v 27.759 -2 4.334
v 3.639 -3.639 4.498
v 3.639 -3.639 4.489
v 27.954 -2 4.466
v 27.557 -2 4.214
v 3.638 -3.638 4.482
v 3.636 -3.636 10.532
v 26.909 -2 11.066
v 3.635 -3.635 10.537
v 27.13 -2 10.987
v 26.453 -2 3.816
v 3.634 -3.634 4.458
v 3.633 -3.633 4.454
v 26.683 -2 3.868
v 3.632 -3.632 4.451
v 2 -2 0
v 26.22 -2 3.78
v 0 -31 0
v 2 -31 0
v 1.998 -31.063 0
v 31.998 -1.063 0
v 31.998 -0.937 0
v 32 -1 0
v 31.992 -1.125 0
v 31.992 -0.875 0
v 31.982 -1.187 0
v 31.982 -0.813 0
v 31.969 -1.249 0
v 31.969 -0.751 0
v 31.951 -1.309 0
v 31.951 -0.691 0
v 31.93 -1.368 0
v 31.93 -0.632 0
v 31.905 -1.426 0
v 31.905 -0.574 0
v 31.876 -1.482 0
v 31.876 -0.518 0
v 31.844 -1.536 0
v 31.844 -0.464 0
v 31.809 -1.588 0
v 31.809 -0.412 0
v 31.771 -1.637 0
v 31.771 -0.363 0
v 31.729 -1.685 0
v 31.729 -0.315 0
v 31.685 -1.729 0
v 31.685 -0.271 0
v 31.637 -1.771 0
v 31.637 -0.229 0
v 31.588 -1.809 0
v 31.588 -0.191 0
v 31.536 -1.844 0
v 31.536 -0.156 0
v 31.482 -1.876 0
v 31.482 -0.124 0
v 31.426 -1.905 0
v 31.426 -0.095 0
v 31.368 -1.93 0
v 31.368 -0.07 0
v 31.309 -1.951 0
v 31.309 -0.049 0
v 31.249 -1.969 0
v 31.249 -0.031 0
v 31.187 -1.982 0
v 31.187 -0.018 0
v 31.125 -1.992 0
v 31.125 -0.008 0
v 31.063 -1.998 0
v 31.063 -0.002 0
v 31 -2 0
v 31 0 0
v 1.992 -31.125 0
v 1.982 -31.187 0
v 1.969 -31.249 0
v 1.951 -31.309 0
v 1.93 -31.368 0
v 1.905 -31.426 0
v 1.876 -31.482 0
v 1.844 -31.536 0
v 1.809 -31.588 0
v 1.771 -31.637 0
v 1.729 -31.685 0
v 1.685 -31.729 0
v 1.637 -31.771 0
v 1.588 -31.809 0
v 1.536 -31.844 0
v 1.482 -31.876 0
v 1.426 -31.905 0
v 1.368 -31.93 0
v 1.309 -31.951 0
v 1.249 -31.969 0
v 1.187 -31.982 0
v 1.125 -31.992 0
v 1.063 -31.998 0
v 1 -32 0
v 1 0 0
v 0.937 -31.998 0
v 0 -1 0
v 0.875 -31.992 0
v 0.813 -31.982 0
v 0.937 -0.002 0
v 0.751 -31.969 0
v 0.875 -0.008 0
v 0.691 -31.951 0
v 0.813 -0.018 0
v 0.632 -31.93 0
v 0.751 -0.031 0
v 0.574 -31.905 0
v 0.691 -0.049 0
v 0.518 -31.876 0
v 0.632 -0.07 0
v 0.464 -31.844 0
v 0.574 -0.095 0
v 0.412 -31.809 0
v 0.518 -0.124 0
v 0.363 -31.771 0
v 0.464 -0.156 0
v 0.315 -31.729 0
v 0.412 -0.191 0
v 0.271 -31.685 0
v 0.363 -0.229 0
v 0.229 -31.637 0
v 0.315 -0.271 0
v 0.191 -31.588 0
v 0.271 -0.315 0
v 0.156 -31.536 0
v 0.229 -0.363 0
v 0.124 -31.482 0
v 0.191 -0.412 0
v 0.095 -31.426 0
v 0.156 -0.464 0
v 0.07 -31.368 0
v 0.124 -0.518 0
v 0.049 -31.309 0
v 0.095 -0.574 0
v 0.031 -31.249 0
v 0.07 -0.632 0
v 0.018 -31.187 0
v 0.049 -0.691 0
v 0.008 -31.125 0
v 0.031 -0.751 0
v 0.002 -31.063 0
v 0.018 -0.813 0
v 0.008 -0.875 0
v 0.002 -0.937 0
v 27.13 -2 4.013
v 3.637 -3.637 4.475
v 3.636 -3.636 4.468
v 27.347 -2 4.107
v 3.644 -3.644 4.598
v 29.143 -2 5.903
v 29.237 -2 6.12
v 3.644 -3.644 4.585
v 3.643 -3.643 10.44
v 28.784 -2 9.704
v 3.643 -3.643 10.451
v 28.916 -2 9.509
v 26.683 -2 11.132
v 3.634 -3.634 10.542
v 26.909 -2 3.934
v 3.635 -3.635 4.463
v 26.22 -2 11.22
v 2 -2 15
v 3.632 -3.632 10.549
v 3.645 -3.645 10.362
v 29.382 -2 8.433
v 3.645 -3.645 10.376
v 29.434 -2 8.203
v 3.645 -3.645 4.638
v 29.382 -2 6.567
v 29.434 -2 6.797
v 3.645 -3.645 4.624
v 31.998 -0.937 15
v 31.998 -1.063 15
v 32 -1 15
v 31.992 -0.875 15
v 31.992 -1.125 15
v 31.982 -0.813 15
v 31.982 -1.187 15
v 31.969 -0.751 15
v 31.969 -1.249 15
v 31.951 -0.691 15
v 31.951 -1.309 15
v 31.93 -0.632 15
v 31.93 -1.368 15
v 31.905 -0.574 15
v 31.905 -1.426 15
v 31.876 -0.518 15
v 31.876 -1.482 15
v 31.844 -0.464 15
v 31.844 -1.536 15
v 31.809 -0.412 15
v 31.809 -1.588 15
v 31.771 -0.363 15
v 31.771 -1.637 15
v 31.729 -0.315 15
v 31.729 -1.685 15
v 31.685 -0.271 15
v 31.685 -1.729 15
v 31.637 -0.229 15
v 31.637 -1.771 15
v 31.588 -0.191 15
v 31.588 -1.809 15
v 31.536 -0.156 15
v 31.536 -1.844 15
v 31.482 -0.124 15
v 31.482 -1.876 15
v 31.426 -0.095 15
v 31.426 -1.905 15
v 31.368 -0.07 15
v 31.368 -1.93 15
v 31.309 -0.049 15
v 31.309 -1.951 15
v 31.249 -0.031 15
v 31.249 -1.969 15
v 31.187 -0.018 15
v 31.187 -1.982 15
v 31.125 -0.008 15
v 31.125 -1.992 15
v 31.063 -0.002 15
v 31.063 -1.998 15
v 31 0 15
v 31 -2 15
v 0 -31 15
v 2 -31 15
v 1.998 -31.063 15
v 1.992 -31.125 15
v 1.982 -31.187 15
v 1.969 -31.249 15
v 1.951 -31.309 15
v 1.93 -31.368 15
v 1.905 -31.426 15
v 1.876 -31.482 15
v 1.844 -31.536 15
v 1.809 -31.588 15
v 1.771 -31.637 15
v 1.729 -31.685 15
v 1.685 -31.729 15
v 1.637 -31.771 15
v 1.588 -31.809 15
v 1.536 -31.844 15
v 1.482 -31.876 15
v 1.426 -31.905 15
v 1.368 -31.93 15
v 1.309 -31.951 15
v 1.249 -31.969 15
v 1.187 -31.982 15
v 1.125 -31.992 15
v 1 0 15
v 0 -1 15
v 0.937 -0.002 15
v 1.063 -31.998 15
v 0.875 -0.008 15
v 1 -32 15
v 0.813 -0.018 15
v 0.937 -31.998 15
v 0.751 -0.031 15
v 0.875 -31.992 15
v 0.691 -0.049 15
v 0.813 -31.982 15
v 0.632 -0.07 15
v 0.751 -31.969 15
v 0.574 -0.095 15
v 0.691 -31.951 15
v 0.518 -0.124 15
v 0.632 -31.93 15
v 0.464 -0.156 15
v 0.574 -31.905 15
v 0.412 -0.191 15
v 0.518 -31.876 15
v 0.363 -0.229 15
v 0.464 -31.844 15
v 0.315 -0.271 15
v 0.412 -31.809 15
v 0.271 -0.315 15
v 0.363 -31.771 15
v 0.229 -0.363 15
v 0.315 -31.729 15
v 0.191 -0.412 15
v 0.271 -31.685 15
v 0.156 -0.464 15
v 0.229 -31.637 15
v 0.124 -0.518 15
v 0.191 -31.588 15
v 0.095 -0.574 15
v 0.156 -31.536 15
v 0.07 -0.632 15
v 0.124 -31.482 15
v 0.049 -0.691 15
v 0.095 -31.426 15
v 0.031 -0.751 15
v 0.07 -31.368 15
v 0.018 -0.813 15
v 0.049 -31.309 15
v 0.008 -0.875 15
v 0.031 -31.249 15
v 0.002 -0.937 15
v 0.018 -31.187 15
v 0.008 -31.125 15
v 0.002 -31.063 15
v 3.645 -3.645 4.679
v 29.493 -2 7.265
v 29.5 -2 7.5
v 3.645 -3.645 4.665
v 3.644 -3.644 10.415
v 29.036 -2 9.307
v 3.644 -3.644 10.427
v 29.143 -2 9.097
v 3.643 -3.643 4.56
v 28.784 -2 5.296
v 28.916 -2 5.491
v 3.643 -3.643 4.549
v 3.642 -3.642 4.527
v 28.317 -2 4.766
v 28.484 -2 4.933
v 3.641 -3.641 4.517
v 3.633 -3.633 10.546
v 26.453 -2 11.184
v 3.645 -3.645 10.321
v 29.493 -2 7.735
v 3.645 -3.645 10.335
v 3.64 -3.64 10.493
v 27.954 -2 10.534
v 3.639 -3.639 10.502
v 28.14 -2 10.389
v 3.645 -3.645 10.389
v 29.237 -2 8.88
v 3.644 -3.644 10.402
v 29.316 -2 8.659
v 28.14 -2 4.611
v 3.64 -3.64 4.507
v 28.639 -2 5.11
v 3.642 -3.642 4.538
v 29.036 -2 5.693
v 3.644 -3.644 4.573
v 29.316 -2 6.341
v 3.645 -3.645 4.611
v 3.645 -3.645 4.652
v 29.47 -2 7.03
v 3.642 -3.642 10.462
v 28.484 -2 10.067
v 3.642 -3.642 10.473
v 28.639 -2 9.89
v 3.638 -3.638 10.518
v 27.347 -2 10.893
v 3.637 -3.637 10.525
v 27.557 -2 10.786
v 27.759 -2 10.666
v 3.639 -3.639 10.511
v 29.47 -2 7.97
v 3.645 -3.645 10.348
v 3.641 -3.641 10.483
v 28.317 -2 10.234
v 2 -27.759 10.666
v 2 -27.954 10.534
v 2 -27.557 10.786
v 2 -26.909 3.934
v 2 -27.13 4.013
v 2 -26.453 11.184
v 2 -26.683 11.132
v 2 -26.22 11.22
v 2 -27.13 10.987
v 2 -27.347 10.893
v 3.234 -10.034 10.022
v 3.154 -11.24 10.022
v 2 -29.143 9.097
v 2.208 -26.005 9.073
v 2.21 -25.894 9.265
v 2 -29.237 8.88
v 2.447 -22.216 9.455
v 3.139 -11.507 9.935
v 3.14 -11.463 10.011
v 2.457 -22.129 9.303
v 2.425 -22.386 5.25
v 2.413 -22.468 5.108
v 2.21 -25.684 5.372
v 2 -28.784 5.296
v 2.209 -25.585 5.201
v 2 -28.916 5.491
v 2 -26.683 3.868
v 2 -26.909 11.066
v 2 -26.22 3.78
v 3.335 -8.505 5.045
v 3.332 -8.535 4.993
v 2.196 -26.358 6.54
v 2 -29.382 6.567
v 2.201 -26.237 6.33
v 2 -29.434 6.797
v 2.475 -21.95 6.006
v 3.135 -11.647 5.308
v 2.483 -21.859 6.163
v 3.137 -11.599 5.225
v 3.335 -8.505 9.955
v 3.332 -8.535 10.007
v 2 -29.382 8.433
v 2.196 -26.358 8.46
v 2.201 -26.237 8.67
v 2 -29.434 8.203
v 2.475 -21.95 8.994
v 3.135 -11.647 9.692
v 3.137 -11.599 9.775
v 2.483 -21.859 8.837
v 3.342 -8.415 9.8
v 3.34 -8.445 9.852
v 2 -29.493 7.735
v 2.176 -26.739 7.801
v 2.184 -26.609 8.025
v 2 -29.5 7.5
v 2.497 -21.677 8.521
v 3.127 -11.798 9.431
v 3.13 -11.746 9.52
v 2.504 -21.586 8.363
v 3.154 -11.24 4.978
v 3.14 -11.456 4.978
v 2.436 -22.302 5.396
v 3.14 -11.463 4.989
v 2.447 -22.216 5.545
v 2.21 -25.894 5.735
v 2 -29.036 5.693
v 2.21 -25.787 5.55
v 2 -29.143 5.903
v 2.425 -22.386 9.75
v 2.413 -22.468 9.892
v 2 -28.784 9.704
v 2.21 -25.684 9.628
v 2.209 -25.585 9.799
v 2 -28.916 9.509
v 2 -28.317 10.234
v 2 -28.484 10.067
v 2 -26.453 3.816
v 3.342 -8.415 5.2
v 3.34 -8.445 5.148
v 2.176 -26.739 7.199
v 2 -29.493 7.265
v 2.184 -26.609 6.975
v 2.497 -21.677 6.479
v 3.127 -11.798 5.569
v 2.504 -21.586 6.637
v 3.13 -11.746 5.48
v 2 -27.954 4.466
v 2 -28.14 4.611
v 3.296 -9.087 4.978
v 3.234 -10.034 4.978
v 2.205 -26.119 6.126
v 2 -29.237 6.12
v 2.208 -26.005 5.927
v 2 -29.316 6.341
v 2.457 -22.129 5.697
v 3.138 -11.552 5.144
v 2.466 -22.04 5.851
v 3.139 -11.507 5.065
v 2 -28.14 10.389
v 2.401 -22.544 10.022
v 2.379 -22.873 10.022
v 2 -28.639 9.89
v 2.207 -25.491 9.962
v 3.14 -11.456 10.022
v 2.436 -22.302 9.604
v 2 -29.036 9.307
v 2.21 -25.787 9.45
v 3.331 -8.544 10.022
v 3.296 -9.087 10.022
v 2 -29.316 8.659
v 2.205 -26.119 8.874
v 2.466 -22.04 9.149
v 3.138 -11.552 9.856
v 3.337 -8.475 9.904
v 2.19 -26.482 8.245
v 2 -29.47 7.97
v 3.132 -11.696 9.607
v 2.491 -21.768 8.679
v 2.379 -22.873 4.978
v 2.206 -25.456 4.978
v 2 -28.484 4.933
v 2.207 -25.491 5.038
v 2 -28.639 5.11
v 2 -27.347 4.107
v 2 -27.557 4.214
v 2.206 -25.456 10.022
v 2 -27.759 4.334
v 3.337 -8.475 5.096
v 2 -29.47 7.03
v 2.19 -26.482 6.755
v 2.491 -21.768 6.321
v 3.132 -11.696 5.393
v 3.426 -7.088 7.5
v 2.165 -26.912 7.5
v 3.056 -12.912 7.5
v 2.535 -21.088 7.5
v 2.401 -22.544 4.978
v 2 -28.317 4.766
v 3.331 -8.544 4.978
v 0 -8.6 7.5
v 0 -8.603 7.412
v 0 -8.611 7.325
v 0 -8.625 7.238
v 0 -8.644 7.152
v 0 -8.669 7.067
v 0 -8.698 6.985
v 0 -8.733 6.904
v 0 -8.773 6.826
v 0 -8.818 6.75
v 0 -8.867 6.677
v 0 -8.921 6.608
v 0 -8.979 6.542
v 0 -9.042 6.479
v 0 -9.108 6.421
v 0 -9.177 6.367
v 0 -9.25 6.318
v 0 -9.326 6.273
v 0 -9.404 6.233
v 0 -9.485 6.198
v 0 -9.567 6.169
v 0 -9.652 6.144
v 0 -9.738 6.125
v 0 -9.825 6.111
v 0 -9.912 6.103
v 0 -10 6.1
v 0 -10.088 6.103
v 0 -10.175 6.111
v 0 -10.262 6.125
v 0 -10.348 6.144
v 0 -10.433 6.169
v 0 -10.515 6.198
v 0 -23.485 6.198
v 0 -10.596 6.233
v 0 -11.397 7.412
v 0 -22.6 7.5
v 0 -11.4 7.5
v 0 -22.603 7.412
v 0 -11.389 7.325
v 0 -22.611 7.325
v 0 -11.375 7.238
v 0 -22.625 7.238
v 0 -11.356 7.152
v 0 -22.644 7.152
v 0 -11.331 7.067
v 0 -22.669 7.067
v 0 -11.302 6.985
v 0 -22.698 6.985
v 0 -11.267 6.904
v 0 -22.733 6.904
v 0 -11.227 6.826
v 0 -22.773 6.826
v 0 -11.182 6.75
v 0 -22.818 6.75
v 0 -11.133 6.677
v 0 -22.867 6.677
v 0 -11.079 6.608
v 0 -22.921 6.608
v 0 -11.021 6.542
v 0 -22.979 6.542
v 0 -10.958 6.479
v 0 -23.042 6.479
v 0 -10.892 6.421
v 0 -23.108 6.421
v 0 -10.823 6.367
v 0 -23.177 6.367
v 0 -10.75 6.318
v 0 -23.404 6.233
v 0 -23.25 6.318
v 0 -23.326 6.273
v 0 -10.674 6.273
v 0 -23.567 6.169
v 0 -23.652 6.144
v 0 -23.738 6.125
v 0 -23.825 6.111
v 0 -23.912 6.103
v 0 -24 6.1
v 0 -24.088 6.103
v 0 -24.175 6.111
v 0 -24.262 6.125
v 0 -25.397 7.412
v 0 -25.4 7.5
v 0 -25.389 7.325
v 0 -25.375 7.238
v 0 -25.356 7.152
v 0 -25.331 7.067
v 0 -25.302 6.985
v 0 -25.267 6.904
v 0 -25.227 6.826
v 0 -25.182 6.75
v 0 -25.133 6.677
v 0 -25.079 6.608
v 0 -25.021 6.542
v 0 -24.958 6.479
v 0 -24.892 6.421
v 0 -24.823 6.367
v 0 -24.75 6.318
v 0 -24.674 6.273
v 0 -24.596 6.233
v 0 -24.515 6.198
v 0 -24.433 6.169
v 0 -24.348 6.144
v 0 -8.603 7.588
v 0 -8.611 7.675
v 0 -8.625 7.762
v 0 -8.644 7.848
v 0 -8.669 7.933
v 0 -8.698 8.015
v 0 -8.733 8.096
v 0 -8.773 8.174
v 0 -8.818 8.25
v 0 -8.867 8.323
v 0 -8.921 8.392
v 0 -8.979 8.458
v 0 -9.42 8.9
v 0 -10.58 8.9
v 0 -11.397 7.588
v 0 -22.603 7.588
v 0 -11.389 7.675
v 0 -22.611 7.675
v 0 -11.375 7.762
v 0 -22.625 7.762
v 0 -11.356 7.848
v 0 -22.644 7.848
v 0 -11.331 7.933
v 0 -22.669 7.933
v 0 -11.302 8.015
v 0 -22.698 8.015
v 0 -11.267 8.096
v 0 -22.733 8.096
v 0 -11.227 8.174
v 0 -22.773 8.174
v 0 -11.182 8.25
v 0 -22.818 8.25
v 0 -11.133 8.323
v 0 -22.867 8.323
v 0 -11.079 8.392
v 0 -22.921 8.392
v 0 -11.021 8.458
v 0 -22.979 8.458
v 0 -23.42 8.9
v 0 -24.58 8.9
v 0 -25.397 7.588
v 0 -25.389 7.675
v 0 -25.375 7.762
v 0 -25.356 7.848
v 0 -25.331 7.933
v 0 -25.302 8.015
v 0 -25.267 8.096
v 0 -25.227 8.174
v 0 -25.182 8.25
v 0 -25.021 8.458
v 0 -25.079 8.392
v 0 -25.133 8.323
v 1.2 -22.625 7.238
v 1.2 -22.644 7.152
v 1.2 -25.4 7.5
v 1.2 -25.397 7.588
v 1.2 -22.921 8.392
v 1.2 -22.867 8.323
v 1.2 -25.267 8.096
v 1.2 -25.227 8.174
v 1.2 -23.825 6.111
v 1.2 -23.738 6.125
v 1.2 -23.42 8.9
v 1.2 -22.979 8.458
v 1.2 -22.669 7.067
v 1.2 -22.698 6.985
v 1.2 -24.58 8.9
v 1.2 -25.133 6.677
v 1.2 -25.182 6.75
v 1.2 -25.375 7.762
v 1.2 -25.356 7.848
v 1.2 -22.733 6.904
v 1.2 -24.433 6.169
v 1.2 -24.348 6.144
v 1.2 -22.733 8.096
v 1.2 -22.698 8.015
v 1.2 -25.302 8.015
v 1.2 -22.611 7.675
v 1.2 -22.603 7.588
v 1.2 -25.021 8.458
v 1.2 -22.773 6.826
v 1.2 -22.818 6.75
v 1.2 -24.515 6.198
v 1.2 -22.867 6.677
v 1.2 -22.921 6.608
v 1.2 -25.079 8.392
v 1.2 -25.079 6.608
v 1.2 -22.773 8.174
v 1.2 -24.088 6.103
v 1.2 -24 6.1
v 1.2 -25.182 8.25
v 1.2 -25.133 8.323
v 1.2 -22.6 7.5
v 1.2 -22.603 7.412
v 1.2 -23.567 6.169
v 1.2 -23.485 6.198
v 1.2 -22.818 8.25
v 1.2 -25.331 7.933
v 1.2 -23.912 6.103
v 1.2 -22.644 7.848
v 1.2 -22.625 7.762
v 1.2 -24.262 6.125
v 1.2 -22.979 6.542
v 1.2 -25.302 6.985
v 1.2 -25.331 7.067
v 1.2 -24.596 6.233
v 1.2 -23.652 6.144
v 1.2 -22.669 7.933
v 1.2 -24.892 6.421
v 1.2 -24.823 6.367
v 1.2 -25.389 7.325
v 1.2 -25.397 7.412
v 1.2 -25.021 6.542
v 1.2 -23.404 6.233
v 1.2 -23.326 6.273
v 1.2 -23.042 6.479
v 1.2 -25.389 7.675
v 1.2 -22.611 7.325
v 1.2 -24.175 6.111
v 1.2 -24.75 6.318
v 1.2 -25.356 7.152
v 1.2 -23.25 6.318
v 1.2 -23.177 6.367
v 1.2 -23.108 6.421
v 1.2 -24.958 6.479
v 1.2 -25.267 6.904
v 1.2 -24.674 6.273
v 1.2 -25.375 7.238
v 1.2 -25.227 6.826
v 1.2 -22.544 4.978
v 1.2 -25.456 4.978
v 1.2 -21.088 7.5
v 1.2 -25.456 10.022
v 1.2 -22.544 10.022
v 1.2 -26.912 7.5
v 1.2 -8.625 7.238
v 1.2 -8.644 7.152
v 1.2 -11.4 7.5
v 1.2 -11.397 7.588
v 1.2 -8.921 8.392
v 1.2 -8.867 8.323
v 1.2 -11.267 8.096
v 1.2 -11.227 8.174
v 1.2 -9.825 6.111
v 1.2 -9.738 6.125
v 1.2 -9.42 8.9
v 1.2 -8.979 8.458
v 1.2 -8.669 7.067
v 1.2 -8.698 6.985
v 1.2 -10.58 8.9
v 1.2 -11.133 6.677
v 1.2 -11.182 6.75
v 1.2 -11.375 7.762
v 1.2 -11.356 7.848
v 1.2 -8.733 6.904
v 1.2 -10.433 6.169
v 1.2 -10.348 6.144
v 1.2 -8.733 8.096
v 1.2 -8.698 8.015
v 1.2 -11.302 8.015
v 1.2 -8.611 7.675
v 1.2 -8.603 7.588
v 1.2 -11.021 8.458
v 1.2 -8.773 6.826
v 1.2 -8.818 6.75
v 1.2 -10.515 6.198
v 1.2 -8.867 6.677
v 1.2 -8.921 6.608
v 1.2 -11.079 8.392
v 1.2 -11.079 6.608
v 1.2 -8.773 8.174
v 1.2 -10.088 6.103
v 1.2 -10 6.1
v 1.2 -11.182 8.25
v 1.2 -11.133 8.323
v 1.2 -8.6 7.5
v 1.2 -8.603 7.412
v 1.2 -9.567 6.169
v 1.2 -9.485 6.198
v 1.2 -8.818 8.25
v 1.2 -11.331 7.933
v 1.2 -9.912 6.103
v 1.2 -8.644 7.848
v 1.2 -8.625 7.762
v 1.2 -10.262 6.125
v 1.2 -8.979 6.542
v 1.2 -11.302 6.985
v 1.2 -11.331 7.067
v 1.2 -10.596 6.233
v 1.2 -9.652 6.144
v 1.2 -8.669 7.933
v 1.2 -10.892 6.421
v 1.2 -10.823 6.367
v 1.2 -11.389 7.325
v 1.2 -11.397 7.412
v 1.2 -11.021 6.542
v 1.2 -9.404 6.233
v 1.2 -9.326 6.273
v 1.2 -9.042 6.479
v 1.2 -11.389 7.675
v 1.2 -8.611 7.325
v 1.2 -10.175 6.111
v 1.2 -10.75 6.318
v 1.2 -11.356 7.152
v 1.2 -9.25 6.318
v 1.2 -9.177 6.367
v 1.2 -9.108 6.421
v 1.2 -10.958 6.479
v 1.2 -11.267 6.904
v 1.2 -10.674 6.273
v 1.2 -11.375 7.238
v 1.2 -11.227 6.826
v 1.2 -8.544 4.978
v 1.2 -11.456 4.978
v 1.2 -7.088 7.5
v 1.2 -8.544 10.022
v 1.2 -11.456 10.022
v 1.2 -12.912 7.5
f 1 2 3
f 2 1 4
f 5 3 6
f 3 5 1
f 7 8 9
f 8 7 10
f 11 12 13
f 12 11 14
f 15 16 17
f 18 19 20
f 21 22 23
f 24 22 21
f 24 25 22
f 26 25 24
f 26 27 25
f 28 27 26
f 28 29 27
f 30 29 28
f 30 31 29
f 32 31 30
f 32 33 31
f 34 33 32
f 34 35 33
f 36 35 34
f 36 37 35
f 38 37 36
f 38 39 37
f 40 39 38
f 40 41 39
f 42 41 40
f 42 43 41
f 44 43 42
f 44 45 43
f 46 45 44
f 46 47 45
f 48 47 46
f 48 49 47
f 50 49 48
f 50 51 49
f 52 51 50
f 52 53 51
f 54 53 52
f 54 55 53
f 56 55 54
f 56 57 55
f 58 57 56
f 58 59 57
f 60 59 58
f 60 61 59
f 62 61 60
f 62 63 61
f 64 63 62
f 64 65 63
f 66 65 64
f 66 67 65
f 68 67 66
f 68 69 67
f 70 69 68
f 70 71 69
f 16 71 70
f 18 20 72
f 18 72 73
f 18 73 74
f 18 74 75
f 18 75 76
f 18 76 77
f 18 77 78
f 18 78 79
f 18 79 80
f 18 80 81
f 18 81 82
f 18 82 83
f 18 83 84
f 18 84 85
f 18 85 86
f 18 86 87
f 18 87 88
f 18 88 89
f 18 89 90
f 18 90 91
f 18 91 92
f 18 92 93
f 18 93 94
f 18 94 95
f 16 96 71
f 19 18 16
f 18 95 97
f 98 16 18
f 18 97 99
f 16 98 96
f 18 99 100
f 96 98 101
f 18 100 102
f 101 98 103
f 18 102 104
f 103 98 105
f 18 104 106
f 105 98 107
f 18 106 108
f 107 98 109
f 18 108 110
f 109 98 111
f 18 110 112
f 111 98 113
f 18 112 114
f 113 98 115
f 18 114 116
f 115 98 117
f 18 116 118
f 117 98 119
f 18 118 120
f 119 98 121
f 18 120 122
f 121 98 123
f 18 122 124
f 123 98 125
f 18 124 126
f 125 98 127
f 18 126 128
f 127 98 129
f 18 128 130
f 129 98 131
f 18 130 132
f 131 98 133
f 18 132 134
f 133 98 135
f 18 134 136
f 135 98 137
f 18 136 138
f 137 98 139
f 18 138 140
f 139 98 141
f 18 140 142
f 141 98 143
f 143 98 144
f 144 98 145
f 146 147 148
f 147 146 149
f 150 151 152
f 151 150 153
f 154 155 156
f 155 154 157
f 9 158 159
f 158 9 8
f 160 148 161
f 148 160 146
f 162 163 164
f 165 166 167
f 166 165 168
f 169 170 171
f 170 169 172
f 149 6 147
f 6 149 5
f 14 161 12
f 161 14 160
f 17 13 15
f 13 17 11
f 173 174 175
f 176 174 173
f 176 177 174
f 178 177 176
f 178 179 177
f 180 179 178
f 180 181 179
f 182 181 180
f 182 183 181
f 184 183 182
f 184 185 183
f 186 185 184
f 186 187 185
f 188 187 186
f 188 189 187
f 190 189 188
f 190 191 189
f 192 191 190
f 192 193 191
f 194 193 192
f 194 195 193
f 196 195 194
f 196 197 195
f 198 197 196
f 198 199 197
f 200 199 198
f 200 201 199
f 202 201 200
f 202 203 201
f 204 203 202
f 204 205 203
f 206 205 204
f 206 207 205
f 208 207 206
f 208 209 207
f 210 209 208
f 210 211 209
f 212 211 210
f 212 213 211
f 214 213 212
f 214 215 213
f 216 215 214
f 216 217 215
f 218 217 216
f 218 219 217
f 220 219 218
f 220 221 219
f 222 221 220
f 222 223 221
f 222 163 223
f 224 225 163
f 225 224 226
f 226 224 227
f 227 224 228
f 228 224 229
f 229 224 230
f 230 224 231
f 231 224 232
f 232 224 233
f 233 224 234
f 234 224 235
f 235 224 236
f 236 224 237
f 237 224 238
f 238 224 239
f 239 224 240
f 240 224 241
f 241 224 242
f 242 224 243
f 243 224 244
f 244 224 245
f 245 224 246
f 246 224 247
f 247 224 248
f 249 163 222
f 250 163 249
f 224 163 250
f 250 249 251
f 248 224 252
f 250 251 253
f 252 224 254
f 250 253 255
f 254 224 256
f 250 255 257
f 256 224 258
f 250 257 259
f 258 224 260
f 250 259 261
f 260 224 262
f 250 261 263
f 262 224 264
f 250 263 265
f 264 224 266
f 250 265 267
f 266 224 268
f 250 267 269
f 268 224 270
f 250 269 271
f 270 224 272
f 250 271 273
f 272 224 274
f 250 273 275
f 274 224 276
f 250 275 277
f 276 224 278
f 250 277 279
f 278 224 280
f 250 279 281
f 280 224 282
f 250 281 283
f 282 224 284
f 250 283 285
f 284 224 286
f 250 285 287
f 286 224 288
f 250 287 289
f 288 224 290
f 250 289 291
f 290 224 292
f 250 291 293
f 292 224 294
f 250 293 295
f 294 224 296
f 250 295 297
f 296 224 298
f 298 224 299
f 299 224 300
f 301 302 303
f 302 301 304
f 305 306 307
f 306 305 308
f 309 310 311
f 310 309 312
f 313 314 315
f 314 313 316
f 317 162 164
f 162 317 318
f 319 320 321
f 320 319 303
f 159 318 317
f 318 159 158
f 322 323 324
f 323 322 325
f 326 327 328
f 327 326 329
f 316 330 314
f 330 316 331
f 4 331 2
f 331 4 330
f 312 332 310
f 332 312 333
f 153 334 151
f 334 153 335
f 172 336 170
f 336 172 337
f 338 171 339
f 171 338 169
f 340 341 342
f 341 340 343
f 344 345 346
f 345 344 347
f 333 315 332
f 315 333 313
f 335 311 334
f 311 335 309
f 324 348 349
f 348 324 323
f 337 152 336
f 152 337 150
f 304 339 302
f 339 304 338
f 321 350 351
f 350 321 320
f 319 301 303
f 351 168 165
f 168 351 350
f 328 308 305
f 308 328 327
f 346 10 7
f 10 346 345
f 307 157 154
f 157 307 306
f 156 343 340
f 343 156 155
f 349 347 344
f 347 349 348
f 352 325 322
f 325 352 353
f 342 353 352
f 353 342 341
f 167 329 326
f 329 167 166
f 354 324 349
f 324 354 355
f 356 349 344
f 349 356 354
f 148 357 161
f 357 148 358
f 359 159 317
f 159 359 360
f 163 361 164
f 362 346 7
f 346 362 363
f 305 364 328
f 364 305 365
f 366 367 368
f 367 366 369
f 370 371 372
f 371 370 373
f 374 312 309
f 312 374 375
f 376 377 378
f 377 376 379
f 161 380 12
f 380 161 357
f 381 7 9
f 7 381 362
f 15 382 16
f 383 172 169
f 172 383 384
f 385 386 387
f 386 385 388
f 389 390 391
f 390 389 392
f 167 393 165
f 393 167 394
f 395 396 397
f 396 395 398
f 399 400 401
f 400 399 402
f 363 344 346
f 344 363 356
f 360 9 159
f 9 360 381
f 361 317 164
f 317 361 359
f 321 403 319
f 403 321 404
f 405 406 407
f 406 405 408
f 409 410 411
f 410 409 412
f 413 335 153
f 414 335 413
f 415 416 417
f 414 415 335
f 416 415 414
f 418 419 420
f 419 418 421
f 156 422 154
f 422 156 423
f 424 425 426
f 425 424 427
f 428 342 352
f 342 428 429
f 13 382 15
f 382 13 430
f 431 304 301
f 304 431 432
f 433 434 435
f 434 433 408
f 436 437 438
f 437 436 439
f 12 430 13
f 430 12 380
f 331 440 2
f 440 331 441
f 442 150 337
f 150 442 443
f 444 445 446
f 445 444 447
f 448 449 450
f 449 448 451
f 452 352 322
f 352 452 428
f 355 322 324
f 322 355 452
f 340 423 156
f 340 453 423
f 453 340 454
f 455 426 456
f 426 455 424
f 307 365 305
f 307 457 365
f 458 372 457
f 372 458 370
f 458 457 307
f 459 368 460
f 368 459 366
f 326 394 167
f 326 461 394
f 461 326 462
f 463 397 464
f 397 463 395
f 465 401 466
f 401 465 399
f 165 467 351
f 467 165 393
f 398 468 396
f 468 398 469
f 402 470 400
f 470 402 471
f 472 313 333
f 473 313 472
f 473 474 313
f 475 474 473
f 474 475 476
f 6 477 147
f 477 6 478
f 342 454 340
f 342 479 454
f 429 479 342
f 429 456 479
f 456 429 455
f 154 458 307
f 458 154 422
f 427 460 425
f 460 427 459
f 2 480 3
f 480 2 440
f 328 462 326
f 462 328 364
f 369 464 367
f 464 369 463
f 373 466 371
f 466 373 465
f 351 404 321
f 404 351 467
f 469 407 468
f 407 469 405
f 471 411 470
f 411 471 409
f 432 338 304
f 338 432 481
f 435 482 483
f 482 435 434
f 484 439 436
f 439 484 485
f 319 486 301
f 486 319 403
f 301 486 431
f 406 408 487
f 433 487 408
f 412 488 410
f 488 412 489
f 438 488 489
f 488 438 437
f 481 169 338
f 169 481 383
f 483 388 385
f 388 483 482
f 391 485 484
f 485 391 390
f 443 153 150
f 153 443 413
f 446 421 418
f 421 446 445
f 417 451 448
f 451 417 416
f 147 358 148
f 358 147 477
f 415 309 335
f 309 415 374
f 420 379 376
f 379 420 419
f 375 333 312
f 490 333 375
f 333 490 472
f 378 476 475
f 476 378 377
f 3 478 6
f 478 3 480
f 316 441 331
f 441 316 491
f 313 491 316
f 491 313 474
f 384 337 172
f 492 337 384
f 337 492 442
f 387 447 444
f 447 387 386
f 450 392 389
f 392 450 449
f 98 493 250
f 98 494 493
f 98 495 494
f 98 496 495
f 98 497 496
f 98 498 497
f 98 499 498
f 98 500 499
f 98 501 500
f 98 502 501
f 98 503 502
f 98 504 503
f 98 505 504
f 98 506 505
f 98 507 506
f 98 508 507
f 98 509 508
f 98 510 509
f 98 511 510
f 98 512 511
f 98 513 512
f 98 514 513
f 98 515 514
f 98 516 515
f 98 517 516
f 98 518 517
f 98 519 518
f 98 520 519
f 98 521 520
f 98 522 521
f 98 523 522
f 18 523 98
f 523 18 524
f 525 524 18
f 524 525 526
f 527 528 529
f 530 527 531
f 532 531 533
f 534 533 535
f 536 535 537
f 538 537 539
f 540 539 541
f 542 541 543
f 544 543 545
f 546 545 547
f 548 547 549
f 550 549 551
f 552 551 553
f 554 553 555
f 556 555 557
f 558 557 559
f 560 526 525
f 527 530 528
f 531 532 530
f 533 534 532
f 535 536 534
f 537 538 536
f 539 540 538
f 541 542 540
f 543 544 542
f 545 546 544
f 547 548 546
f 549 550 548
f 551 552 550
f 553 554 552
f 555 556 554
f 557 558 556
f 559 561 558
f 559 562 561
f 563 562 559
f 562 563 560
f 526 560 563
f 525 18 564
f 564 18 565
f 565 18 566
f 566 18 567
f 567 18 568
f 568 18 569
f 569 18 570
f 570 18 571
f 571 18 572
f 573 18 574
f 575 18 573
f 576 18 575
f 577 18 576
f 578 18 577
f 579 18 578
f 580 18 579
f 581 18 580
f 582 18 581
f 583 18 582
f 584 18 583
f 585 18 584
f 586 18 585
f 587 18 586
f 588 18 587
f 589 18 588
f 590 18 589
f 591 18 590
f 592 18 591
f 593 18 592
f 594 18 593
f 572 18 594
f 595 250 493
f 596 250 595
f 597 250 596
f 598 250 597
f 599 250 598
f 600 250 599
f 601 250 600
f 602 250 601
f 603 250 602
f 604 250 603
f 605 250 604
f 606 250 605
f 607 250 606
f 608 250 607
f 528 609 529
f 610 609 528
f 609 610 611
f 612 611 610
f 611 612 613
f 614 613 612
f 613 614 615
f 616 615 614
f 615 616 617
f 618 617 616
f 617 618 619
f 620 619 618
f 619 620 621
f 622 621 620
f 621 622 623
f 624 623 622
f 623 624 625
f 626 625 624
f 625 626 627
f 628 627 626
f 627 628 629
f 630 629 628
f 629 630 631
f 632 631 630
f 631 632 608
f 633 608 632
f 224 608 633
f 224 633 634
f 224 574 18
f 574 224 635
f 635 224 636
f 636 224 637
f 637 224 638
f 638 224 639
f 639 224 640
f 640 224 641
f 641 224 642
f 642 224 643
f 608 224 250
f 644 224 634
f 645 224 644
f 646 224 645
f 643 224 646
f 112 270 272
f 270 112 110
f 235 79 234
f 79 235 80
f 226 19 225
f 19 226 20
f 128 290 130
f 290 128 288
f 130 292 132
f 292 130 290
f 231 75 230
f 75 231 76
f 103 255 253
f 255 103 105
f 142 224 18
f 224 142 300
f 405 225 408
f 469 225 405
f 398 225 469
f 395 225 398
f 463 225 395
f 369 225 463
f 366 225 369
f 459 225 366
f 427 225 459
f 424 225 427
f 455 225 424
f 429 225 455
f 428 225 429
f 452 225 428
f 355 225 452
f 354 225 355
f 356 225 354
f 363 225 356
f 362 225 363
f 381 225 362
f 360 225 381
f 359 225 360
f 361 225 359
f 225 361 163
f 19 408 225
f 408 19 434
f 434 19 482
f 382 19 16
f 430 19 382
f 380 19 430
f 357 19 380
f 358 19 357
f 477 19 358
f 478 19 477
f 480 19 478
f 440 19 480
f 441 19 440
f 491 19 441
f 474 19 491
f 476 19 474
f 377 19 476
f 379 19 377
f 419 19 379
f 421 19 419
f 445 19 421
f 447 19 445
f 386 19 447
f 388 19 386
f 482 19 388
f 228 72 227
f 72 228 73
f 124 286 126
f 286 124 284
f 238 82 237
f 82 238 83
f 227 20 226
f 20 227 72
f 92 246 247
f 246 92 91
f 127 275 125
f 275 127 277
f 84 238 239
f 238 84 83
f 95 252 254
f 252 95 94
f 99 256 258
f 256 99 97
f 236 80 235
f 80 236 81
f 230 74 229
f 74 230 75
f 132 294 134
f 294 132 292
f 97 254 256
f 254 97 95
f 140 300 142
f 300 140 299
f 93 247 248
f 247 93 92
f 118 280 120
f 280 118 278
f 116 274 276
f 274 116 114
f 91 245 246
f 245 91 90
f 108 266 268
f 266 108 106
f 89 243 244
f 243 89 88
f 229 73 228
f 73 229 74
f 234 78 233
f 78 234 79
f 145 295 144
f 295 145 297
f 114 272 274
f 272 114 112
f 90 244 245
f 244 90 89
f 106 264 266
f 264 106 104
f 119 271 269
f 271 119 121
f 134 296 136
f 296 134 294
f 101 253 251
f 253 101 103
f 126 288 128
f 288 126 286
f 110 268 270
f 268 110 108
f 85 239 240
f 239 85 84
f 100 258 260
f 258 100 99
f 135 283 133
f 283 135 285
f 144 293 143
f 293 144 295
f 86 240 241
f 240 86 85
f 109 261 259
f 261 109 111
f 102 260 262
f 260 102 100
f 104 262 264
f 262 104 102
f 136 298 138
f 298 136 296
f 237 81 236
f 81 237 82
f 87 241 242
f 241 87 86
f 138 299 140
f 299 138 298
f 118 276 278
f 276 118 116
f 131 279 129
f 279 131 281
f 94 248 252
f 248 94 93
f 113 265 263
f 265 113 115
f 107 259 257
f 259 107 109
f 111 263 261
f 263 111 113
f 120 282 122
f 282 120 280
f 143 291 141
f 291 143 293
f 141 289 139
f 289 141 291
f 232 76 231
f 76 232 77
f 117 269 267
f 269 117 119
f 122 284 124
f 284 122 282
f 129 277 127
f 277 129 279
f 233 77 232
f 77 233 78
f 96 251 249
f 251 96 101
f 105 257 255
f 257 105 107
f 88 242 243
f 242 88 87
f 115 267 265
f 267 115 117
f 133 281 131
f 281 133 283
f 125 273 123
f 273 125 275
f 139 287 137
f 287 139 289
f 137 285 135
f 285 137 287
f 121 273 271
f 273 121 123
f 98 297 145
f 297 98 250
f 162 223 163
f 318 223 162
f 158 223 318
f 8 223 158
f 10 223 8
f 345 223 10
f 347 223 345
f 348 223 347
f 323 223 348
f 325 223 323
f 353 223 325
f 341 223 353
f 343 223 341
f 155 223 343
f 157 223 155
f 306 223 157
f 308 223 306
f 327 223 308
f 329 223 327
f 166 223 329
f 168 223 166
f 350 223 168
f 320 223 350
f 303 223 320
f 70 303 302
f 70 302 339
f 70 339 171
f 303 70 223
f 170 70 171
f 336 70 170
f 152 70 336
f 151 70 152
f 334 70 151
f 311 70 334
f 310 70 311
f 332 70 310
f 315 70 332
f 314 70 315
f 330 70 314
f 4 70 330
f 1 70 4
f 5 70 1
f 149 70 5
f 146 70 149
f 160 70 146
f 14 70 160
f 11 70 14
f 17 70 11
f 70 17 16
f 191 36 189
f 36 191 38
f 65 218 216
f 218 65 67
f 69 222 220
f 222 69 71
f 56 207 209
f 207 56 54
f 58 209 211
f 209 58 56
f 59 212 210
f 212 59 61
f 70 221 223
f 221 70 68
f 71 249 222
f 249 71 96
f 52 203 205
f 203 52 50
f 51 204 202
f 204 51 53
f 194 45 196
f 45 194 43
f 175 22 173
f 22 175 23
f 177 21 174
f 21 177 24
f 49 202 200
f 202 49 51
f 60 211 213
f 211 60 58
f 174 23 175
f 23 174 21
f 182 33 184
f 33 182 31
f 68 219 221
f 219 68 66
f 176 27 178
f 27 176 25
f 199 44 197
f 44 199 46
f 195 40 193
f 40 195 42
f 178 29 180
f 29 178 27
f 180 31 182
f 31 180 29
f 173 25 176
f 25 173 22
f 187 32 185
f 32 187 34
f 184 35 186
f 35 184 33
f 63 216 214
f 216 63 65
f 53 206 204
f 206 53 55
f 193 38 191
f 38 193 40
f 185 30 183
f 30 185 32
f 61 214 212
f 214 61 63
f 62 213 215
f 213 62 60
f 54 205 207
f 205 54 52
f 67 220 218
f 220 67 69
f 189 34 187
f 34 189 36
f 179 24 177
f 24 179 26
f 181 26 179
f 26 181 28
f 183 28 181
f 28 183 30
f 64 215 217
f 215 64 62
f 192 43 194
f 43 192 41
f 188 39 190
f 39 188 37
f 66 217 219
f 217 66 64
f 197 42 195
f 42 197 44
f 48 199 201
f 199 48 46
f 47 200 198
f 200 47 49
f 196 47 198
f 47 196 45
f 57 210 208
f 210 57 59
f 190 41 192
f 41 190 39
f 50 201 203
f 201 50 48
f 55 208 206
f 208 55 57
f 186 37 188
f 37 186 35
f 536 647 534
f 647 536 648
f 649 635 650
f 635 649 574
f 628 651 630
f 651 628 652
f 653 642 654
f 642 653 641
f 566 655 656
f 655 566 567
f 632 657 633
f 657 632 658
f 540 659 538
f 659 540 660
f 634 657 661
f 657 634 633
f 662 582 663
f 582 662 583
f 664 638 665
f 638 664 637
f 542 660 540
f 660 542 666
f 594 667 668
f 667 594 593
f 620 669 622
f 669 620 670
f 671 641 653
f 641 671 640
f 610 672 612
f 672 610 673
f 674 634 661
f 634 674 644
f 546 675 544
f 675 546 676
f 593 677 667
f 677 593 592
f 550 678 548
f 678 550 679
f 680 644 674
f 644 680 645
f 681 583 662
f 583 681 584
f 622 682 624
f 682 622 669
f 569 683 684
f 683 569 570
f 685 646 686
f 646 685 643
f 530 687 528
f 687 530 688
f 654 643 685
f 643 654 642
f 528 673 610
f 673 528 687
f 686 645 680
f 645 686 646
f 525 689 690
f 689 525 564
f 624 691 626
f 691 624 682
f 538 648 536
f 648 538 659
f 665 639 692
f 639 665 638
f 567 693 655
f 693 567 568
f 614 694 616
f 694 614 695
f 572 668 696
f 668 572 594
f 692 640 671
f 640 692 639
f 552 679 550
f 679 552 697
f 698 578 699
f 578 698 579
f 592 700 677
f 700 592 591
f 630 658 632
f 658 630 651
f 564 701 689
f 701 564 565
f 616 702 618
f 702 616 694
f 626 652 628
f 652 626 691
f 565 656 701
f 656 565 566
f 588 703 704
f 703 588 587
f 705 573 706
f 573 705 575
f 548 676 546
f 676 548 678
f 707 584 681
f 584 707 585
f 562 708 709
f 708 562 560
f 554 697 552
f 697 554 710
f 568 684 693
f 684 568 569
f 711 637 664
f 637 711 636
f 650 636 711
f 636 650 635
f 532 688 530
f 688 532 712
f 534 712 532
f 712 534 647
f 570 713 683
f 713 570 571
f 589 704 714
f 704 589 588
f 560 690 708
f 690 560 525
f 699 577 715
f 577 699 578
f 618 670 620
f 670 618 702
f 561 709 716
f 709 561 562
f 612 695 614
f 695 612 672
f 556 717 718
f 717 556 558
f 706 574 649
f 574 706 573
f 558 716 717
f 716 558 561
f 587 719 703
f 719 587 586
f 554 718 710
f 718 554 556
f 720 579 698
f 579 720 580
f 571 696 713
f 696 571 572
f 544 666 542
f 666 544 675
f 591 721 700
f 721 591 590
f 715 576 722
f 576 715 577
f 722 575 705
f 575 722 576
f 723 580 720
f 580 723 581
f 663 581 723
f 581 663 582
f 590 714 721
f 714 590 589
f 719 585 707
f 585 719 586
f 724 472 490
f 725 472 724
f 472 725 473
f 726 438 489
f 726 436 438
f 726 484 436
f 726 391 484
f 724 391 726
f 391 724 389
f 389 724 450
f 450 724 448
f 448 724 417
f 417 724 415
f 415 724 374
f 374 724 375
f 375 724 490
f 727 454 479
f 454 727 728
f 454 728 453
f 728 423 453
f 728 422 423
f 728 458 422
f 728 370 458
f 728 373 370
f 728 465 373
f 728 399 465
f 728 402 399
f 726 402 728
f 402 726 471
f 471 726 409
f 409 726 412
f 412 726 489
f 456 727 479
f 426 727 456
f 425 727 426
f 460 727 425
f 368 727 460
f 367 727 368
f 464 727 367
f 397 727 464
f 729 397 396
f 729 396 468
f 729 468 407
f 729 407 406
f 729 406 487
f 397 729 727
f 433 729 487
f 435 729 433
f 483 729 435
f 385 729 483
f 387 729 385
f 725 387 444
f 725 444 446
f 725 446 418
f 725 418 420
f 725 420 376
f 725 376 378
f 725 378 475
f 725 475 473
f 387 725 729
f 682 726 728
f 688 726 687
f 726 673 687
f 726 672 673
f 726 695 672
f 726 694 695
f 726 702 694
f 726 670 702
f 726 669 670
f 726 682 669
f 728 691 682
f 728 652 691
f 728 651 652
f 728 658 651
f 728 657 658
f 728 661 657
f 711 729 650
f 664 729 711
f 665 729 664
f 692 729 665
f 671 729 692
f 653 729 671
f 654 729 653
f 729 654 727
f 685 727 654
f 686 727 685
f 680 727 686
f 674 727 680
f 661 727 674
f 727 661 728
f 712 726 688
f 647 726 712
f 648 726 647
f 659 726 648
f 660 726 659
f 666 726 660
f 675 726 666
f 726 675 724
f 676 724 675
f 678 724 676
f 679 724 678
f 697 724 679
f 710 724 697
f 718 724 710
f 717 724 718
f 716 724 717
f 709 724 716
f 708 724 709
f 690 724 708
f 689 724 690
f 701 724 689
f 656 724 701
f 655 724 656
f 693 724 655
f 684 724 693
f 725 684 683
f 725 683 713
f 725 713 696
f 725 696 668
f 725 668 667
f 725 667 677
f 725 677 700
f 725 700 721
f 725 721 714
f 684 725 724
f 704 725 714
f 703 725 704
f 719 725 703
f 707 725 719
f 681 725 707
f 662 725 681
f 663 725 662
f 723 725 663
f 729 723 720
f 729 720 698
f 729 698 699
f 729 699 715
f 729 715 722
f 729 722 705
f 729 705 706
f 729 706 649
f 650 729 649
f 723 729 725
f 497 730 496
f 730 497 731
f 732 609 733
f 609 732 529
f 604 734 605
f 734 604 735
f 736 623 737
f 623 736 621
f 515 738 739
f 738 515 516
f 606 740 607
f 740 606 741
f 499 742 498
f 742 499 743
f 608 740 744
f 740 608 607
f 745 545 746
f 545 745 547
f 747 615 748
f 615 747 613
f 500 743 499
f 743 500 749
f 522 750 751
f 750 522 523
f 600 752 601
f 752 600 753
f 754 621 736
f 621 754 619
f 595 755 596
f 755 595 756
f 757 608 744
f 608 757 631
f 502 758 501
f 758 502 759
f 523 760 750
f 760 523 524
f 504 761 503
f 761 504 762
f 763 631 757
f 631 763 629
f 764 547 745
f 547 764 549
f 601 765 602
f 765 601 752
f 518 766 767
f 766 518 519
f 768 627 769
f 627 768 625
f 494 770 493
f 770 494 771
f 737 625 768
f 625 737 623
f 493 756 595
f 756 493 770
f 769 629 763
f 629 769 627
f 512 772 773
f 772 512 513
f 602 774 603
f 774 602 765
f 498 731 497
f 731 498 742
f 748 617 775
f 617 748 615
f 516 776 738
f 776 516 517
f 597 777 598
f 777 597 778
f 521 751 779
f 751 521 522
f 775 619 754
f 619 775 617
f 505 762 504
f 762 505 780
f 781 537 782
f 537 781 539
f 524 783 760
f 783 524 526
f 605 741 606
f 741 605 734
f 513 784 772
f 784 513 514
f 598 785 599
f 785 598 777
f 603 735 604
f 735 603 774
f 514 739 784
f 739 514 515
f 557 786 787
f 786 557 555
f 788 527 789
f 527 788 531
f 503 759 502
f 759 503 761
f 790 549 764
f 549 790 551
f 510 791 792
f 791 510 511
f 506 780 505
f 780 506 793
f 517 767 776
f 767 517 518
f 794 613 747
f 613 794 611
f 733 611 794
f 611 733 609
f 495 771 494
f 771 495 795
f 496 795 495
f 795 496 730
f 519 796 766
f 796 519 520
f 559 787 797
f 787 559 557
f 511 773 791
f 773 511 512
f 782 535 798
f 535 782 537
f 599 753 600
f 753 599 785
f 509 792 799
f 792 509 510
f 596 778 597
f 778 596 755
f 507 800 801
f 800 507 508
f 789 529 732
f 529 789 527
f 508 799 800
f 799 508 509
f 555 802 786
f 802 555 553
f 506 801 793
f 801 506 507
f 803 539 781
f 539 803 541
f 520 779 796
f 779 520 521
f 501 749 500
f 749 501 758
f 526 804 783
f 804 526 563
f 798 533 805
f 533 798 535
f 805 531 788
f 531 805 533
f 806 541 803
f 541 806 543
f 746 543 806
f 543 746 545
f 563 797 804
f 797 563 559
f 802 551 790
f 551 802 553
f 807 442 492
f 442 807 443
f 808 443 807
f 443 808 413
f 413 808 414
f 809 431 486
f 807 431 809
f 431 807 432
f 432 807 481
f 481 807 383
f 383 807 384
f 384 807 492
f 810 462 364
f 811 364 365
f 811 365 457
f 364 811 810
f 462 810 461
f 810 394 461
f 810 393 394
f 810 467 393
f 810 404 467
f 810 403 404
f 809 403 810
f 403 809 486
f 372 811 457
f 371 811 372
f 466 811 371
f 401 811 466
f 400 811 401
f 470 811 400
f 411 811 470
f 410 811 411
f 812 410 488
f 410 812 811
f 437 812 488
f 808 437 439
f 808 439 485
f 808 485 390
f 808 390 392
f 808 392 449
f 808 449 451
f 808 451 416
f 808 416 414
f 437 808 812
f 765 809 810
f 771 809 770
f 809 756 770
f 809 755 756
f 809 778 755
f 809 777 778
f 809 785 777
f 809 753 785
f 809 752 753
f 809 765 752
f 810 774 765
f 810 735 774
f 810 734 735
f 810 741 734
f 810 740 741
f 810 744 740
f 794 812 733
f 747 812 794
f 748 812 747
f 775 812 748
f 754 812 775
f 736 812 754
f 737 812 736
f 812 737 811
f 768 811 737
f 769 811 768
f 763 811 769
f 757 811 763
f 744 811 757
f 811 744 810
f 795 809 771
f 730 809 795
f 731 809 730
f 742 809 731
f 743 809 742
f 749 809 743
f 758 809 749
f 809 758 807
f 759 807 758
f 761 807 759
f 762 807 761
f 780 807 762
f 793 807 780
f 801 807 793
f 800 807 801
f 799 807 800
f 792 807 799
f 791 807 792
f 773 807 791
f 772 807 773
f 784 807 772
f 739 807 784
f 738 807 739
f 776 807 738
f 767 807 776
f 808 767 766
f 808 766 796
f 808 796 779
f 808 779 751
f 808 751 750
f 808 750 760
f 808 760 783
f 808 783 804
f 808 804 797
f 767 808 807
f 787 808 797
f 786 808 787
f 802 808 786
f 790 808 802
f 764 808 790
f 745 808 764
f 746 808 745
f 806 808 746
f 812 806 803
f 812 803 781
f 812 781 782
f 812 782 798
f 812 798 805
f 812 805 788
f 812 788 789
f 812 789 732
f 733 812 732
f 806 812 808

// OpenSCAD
// file: ../utils/teardrops.scad
//
// Mendel90
//
// GNU GPL v2
// nop.head@gmail.com
// hydraraptor.blogspot.com
//
// For making horizontal holes that don't need support material
// Small holes can get away without it but they print better with truncated teardrops
//
module teardrop_2D(r, truncate = true) {
    difference() {
        union() {
            circle(r = r, center = true);
            translate([0,r / sqrt(2),0])
                rotate([0,0,45])
                    square([r, r], center = true);
        }
        if(truncate)
            translate([0, r * 2, 0])
                square([2 * r, 2 * r], center = true);
    }
}

module teardrop(h, r, center, truncate = true)
    render(convexity = 5) linear_extrude(height = h, convexity = 2, center = center)
        teardrop_2D(r, truncate);

module teardrop_plus(h, r, center, truncate = true)
    teardrop(h, r + layer_height / 4, center, truncate);


module tearslot(h, r, w, center)
    linear_extrude(height = h, convexity = 6, center = center)
        hull() {
            translate([-w/2,0,0]) teardrop_2D(r, true);
            translate([ w/2,0,0]) teardrop_2D(r, true);
        }

module vertical_tearslot(h, r, l, center = true)
    linear_extrude(height = h, convexity = 6, center = center)
        hull() {
            translate([0, l / 2]) teardrop_2D(r, true);
            translate([0, -l / 2, 0])
                circle(r = r, center = true);
        }
// main file
//    Shutter stop
//    Copyright (C) 2016  Christian Ege
//
//    This program is free software: you can redistribute it and/or modify
//    it under the terms of the GNU Affero General Public License as
//    published by the Free Software Foundation, either version 3 of the
//    License, or (at your option) any later version.
//
//    This program is distributed in the hope that it will be useful,
//    but WITHOUT ANY WARRANTY; without even the implied warranty of
//    MERCHANTABILITY or FITNESS FOR A PARTICULAR PURPOSE.  See the
//    GNU Affero General Public License for more details.
//
//    You should have received a copy of the GNU Affero General Public License
//    along with this program.  If not, see <http://www.gnu.org/licenses/>.

include <../utils/teardrops.scad>

layerheight = 0.25;
epsilon=layerheight;
height=2;
width = 15;
length=30;

module stiffener_leg() {
    radius=(width/2)/2;
    leg=length-radius-height-epsilon;
    cut=[5,width,20];
    difference() {
        hull() {
            translate([0,-width/2,0]) {
                cube([epsilon,width,epsilon]);
                
            }
            translate([0,-(width/2.5)/2,0]) {
                cube([epsilon,width/2.5,2]);
            }
            translate([leg,0,0]) {
                cylinder(r=radius,h=epsilon,$fn=100);
            }
        }
        rotate([0,45,0]) {
            translate([-cut[0],-width/2,-cut[2]/2]) {
            cube(cut);
            }
        }
    }
}

module base_leg() {
hull() {
        for(i=[0,1]) {
            translate([0,-i*length,0])cylinder(r=height/2,h=width,$fn=100);
        }
    }
}

module base() {
    translate([height/2,-height/2,0]) {
        base_leg();
        rotate([0,0,90]) base_leg();
    }
}

module stiffener() {
    translate([height-(epsilon),0,height-(epsilon)]) {
        stiffener_leg();
        rotate([0,270,180]) stiffener_leg();
    }
}

module base_block() {
    translate([0,0,width/2]) {
        rotate([90,0,0]) {
            stiffener();
        }
    }
    base();
}

module hole(r=2.8/2,h=5*height) {
    rotate([90,0,90])teardrop(h=h,r=r,$fn=100);
    translate([height+epsilon,0,0]) {
        rotate([90,0,90])cylinder(h=h,r=(5.45+1.5*epsilon)/2,$fn=6);
    }
}

module shutter_stop() {
    difference() {
        base_block();
        for(i=[length-6,8+height]) {
            hole_l=5*height;
            translate([-(epsilon+0.8),-i,width/2]) {
                hole(h=hole_l);
            }
        }
    }
}

shutter_stop();
